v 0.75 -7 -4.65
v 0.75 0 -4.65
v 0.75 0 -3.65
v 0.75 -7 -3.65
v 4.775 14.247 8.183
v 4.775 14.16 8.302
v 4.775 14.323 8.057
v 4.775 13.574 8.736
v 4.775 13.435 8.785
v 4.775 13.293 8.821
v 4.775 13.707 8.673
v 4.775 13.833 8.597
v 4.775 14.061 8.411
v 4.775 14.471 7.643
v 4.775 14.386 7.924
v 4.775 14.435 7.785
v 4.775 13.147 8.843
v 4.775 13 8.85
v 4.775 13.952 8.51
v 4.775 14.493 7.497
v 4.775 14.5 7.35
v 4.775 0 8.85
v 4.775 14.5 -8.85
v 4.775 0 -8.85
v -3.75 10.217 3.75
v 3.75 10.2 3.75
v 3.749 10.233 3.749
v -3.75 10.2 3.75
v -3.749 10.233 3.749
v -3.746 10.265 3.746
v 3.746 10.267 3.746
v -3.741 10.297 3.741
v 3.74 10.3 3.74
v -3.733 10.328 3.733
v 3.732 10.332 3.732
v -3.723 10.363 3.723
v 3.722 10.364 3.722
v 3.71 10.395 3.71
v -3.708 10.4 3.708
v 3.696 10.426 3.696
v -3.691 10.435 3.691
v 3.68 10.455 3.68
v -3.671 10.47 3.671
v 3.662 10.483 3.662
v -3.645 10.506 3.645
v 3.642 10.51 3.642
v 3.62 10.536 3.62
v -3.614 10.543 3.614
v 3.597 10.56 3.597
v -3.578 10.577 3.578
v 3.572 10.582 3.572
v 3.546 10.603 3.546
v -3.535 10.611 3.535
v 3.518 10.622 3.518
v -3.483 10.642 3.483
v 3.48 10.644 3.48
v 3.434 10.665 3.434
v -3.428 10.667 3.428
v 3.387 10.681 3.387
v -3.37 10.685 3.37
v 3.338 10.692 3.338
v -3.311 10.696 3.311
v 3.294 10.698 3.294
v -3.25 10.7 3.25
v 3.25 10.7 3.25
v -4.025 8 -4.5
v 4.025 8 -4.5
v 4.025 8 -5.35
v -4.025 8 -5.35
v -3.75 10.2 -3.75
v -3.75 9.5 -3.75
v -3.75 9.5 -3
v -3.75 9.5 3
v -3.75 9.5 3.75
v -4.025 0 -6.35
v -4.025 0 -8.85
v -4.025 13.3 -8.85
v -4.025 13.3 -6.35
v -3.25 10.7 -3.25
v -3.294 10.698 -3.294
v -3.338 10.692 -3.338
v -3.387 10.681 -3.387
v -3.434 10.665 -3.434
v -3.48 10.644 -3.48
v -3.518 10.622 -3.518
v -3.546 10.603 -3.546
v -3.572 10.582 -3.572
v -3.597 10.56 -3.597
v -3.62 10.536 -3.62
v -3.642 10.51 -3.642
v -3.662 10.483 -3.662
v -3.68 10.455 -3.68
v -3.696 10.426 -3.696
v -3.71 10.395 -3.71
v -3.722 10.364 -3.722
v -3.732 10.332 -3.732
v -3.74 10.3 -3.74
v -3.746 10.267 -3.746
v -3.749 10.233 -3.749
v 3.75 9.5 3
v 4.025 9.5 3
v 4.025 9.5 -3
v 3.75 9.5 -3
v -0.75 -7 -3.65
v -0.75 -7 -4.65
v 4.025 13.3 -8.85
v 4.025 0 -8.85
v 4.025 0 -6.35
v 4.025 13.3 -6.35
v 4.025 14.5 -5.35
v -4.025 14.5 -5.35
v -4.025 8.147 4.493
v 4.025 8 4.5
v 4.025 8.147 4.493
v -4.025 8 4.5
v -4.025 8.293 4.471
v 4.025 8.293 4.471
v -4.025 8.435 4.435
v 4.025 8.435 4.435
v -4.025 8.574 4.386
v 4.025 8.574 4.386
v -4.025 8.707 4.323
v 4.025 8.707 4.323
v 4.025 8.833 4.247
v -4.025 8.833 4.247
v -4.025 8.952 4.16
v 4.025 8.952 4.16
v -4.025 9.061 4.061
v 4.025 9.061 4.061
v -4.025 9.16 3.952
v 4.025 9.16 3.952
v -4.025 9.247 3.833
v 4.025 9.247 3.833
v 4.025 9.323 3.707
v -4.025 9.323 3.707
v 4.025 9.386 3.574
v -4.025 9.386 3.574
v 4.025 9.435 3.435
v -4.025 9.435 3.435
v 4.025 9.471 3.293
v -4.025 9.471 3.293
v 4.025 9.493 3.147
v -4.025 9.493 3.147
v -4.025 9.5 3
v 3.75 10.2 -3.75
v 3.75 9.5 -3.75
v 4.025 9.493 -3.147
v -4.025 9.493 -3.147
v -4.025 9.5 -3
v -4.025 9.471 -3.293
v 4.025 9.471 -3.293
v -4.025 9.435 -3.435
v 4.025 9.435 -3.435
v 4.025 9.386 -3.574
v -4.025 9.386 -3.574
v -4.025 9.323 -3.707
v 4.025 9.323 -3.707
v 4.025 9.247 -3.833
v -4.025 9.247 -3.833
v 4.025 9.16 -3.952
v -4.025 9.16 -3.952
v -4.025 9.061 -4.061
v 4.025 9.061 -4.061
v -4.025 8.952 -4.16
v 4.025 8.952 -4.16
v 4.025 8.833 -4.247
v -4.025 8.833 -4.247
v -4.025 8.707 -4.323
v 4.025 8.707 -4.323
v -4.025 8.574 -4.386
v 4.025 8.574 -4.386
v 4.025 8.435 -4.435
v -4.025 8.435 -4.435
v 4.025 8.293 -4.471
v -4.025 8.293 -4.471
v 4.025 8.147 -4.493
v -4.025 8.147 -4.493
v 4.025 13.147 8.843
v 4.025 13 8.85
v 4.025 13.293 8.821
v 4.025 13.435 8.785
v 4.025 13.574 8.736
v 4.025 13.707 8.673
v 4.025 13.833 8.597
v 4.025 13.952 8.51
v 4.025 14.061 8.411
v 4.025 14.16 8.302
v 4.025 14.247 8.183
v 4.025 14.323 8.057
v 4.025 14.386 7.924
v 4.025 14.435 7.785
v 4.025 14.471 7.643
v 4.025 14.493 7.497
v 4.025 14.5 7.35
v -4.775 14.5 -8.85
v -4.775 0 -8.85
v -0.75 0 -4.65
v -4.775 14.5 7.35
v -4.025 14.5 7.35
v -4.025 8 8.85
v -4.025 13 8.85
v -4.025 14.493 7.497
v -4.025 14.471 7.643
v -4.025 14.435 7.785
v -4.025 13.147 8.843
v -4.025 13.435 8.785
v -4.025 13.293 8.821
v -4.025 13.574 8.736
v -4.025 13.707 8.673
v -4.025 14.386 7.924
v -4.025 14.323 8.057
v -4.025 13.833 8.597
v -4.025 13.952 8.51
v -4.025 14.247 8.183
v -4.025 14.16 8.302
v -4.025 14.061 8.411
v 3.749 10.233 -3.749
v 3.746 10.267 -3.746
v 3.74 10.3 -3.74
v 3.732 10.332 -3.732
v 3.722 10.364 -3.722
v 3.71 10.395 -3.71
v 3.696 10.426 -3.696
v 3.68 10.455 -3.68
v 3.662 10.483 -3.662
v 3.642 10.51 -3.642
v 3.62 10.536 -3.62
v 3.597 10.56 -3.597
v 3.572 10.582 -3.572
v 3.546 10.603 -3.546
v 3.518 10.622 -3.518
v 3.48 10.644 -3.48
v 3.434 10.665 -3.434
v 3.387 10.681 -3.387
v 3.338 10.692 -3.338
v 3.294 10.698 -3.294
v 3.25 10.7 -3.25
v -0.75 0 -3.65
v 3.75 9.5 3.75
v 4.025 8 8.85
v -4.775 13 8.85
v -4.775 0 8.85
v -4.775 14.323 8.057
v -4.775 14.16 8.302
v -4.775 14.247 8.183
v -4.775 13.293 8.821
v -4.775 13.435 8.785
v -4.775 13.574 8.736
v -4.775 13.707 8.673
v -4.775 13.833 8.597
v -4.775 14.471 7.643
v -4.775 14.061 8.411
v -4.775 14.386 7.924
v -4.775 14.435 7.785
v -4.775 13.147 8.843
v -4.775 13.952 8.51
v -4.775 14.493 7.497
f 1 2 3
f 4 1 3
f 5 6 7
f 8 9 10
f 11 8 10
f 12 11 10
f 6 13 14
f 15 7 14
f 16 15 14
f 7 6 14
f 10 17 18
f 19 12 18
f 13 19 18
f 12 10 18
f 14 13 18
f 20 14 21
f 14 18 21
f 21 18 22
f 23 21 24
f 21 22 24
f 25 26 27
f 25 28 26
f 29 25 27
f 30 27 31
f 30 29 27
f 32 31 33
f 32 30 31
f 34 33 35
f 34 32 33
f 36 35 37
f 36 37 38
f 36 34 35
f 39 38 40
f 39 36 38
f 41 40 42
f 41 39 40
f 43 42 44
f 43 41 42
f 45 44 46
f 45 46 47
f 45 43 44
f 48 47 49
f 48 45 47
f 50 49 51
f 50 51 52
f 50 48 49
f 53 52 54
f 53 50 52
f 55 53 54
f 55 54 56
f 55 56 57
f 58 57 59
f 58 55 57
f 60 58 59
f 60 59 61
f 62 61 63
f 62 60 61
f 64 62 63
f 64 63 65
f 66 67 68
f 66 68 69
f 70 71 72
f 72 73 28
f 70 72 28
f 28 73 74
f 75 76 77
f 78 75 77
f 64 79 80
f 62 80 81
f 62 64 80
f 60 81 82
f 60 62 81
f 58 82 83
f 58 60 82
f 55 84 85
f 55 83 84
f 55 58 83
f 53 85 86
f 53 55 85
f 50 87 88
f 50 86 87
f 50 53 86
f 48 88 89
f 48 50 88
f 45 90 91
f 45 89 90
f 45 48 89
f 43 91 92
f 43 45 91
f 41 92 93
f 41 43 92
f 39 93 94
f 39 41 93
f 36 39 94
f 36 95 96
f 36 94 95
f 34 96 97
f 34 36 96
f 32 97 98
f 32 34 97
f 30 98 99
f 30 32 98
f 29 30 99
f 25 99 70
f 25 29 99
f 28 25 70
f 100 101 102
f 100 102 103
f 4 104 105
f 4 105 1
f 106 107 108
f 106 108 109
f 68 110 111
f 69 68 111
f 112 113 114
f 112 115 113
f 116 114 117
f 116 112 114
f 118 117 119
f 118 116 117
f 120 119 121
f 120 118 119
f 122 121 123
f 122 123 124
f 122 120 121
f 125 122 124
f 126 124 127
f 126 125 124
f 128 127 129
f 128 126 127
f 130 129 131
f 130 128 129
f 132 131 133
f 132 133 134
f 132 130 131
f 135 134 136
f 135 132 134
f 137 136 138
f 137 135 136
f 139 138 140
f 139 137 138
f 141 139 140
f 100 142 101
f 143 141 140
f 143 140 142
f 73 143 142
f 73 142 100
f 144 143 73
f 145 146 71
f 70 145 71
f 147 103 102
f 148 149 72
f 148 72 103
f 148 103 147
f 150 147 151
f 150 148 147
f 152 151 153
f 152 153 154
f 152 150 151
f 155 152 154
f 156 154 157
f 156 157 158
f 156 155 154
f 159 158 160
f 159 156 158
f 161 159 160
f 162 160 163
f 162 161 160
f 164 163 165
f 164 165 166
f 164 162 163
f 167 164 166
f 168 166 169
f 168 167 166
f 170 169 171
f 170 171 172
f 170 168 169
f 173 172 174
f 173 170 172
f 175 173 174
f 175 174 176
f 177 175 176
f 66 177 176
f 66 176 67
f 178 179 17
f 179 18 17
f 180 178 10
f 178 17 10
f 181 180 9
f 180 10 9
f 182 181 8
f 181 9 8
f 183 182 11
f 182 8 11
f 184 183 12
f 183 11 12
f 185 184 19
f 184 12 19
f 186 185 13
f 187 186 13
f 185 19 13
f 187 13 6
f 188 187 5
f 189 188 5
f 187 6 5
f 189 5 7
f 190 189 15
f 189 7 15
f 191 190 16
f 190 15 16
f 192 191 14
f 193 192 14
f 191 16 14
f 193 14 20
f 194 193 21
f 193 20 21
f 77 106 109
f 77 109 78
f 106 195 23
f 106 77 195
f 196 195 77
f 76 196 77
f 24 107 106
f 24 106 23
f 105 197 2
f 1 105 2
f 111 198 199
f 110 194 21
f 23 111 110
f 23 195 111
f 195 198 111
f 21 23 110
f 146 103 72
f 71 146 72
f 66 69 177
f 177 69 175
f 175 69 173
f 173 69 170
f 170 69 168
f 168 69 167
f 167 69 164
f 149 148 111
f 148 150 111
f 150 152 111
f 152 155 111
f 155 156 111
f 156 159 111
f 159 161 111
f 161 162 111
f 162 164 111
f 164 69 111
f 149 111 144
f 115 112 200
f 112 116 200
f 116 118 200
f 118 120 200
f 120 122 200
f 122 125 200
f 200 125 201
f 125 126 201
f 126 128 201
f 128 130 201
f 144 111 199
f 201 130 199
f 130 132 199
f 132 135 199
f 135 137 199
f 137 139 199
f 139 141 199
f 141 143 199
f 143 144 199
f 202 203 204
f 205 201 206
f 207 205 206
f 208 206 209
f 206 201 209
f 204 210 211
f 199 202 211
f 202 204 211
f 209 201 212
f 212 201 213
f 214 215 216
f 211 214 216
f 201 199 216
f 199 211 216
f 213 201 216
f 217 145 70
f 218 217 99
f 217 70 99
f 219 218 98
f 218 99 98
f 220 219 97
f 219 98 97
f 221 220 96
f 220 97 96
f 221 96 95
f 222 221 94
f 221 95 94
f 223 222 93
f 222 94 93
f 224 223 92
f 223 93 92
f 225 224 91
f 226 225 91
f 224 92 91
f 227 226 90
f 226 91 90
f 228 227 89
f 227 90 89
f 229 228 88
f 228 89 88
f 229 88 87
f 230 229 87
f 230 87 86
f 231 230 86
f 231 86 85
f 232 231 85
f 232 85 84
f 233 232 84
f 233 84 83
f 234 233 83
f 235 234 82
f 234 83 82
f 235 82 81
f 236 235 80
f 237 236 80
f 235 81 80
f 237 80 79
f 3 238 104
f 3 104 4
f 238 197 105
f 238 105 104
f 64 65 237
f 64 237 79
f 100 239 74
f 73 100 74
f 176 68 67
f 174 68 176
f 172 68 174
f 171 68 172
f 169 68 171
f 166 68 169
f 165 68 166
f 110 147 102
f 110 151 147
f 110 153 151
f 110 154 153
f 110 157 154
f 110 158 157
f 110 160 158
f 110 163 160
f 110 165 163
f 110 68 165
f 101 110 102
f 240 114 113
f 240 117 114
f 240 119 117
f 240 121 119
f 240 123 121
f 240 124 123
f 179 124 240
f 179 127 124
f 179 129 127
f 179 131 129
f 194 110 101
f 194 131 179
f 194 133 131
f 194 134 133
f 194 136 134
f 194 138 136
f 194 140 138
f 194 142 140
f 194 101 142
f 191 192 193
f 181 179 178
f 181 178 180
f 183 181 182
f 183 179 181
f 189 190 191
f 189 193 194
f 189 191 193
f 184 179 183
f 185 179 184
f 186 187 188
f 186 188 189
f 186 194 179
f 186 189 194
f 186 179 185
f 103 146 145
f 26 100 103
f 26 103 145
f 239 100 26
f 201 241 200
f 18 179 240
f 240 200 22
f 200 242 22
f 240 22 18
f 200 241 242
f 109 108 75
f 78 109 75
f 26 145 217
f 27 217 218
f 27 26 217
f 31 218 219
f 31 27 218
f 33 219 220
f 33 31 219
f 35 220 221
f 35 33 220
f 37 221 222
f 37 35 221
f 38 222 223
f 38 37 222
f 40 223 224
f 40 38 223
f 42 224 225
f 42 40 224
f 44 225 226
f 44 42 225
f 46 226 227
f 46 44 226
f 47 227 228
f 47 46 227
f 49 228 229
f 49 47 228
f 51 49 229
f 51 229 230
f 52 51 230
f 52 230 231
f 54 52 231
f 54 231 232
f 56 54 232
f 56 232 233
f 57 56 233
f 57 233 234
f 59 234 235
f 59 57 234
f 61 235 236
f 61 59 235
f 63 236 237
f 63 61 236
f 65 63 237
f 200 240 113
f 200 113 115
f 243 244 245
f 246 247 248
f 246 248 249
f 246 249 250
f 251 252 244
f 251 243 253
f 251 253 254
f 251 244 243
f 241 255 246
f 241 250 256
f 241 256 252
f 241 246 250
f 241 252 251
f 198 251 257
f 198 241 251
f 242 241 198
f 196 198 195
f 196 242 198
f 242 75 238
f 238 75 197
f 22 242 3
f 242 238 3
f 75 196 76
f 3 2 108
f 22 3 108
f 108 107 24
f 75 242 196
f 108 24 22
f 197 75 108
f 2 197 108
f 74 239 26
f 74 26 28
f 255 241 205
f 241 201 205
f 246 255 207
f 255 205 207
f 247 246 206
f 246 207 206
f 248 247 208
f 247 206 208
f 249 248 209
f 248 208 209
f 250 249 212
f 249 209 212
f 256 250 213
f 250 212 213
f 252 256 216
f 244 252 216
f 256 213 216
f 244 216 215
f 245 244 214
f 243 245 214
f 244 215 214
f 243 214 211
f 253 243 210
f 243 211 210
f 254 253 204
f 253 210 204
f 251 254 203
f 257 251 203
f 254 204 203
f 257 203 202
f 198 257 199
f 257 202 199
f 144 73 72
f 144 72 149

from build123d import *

# Parameters (mm, degrees)
SKETCH_1_W          = 9.55
SKETCH_1_H          = 17.7
EXTRUDE_1_DEPTH     = 14.5
SKETCH_2_W          = 8.05
SKETCH_2_H          = 14.2
CUT_EXTRUDE_1_DEPTH = 6.5
SKETCH_5_W          = 8.05
SKETCH_5_H          = 13.3
CUT_EXTRUDE_4_DEPTH = 2.5
FILLET_1_R          = 1.5
SKETCH_8_W          = 8.05
SKETCH_8_H          = 9
EXTRUDE_1320_DEPTH  = 1.5
FILLET_2_R          = 1.5
SKETCH_10_W         = 7.5
SKETCH_10_H         = 7.5
EXTRUDE_4_DEPTH     = 1.2
FILLET_4_R          = 0.5
SKETCH_11_W         = 1.5
SKETCH_11_H         = 1
EXTRUDE_1_2_DEPTH   = 7


with BuildPart() as part:
    # 草图1 → Extrude 1 (new body)
    with BuildSketch(Plane(origin=(0, 0, 0), x_dir=(1, 0, 0), z_dir=(0, 1, 0))):
        Rectangle(SKETCH_1_W, SKETCH_1_H)
    extrude(amount=EXTRUDE_1_DEPTH)

    # 草图2 → 切除-拉伸1 (cut)
    with BuildSketch(Plane(origin=(0, 14.5, 0), x_dir=(-1, 0, 0), z_dir=(0, 1, 0))):
        with Locations((0, 1.75)):
            Rectangle(SKETCH_2_W, SKETCH_2_H)
    extrude(amount=-CUT_EXTRUDE_1_DEPTH, mode=Mode.SUBTRACT)

    # 草图5 → 切除-拉伸4 (cut)
    with BuildSketch(Plane(origin=(0, 0, -8.85), x_dir=(-1, 0, 0), z_dir=(0, 0, -1))):
        with Locations((0, 6.65)):
            Rectangle(SKETCH_5_W, SKETCH_5_H)
    extrude(amount=-CUT_EXTRUDE_4_DEPTH, mode=Mode.SUBTRACT)

    # 圆角1
    fillet_1_edges = [part.edges().sort_by_distance(p)[0] for p in [
        (4.4, 14.5, 8.85),
        (-4.4, 14.5, 8.85),
    ]]
    fillet(fillet_1_edges, radius=FILLET_1_R)

    # 草图8 → Extrude 1320 (add)
    with BuildSketch(Plane(origin=(0, 8, 0), x_dir=(-1, 0, 0), z_dir=(0, 1, 0))):
        Rectangle(SKETCH_8_W, SKETCH_8_H)
    extrude(amount=EXTRUDE_1320_DEPTH)

    # 圆角2
    fillet_2_edges = [part.edges().sort_by_distance(p)[0] for p in [
        (0, 9.5, -4.5),
        (0, 9.5, 4.5),
    ]]
    fillet(fillet_2_edges, radius=FILLET_2_R - 0.0001)  # a hair under: the kernel refuses the full size

    # 草图10 → 拉伸4 (add)
    with BuildSketch(Plane(origin=(0, 9.5, 0), x_dir=(-1, 0, 0), z_dir=(0, 1, 0))):
        Rectangle(SKETCH_10_W, SKETCH_10_H)
    extrude(amount=EXTRUDE_4_DEPTH)

    # 圆角4
    fillet_4_edges = [part.edges().sort_by_distance(p)[0] for p in [
        (3.75, 10.7, 0),
        (0, 10.7, -3.75),
        (-3.75, 10.7, 0),
        (0, 10.7, 3.75),
    ]]
    fillet(fillet_4_edges, radius=FILLET_4_R)

    # 草图11 → Extrude 1 2 (add)
    with BuildSketch(Plane.XZ):
        with Locations((0, -4.15)):
            Rectangle(SKETCH_11_W, SKETCH_11_H)
    extrude(amount=EXTRUDE_1_2_DEPTH)


solid = part.part
